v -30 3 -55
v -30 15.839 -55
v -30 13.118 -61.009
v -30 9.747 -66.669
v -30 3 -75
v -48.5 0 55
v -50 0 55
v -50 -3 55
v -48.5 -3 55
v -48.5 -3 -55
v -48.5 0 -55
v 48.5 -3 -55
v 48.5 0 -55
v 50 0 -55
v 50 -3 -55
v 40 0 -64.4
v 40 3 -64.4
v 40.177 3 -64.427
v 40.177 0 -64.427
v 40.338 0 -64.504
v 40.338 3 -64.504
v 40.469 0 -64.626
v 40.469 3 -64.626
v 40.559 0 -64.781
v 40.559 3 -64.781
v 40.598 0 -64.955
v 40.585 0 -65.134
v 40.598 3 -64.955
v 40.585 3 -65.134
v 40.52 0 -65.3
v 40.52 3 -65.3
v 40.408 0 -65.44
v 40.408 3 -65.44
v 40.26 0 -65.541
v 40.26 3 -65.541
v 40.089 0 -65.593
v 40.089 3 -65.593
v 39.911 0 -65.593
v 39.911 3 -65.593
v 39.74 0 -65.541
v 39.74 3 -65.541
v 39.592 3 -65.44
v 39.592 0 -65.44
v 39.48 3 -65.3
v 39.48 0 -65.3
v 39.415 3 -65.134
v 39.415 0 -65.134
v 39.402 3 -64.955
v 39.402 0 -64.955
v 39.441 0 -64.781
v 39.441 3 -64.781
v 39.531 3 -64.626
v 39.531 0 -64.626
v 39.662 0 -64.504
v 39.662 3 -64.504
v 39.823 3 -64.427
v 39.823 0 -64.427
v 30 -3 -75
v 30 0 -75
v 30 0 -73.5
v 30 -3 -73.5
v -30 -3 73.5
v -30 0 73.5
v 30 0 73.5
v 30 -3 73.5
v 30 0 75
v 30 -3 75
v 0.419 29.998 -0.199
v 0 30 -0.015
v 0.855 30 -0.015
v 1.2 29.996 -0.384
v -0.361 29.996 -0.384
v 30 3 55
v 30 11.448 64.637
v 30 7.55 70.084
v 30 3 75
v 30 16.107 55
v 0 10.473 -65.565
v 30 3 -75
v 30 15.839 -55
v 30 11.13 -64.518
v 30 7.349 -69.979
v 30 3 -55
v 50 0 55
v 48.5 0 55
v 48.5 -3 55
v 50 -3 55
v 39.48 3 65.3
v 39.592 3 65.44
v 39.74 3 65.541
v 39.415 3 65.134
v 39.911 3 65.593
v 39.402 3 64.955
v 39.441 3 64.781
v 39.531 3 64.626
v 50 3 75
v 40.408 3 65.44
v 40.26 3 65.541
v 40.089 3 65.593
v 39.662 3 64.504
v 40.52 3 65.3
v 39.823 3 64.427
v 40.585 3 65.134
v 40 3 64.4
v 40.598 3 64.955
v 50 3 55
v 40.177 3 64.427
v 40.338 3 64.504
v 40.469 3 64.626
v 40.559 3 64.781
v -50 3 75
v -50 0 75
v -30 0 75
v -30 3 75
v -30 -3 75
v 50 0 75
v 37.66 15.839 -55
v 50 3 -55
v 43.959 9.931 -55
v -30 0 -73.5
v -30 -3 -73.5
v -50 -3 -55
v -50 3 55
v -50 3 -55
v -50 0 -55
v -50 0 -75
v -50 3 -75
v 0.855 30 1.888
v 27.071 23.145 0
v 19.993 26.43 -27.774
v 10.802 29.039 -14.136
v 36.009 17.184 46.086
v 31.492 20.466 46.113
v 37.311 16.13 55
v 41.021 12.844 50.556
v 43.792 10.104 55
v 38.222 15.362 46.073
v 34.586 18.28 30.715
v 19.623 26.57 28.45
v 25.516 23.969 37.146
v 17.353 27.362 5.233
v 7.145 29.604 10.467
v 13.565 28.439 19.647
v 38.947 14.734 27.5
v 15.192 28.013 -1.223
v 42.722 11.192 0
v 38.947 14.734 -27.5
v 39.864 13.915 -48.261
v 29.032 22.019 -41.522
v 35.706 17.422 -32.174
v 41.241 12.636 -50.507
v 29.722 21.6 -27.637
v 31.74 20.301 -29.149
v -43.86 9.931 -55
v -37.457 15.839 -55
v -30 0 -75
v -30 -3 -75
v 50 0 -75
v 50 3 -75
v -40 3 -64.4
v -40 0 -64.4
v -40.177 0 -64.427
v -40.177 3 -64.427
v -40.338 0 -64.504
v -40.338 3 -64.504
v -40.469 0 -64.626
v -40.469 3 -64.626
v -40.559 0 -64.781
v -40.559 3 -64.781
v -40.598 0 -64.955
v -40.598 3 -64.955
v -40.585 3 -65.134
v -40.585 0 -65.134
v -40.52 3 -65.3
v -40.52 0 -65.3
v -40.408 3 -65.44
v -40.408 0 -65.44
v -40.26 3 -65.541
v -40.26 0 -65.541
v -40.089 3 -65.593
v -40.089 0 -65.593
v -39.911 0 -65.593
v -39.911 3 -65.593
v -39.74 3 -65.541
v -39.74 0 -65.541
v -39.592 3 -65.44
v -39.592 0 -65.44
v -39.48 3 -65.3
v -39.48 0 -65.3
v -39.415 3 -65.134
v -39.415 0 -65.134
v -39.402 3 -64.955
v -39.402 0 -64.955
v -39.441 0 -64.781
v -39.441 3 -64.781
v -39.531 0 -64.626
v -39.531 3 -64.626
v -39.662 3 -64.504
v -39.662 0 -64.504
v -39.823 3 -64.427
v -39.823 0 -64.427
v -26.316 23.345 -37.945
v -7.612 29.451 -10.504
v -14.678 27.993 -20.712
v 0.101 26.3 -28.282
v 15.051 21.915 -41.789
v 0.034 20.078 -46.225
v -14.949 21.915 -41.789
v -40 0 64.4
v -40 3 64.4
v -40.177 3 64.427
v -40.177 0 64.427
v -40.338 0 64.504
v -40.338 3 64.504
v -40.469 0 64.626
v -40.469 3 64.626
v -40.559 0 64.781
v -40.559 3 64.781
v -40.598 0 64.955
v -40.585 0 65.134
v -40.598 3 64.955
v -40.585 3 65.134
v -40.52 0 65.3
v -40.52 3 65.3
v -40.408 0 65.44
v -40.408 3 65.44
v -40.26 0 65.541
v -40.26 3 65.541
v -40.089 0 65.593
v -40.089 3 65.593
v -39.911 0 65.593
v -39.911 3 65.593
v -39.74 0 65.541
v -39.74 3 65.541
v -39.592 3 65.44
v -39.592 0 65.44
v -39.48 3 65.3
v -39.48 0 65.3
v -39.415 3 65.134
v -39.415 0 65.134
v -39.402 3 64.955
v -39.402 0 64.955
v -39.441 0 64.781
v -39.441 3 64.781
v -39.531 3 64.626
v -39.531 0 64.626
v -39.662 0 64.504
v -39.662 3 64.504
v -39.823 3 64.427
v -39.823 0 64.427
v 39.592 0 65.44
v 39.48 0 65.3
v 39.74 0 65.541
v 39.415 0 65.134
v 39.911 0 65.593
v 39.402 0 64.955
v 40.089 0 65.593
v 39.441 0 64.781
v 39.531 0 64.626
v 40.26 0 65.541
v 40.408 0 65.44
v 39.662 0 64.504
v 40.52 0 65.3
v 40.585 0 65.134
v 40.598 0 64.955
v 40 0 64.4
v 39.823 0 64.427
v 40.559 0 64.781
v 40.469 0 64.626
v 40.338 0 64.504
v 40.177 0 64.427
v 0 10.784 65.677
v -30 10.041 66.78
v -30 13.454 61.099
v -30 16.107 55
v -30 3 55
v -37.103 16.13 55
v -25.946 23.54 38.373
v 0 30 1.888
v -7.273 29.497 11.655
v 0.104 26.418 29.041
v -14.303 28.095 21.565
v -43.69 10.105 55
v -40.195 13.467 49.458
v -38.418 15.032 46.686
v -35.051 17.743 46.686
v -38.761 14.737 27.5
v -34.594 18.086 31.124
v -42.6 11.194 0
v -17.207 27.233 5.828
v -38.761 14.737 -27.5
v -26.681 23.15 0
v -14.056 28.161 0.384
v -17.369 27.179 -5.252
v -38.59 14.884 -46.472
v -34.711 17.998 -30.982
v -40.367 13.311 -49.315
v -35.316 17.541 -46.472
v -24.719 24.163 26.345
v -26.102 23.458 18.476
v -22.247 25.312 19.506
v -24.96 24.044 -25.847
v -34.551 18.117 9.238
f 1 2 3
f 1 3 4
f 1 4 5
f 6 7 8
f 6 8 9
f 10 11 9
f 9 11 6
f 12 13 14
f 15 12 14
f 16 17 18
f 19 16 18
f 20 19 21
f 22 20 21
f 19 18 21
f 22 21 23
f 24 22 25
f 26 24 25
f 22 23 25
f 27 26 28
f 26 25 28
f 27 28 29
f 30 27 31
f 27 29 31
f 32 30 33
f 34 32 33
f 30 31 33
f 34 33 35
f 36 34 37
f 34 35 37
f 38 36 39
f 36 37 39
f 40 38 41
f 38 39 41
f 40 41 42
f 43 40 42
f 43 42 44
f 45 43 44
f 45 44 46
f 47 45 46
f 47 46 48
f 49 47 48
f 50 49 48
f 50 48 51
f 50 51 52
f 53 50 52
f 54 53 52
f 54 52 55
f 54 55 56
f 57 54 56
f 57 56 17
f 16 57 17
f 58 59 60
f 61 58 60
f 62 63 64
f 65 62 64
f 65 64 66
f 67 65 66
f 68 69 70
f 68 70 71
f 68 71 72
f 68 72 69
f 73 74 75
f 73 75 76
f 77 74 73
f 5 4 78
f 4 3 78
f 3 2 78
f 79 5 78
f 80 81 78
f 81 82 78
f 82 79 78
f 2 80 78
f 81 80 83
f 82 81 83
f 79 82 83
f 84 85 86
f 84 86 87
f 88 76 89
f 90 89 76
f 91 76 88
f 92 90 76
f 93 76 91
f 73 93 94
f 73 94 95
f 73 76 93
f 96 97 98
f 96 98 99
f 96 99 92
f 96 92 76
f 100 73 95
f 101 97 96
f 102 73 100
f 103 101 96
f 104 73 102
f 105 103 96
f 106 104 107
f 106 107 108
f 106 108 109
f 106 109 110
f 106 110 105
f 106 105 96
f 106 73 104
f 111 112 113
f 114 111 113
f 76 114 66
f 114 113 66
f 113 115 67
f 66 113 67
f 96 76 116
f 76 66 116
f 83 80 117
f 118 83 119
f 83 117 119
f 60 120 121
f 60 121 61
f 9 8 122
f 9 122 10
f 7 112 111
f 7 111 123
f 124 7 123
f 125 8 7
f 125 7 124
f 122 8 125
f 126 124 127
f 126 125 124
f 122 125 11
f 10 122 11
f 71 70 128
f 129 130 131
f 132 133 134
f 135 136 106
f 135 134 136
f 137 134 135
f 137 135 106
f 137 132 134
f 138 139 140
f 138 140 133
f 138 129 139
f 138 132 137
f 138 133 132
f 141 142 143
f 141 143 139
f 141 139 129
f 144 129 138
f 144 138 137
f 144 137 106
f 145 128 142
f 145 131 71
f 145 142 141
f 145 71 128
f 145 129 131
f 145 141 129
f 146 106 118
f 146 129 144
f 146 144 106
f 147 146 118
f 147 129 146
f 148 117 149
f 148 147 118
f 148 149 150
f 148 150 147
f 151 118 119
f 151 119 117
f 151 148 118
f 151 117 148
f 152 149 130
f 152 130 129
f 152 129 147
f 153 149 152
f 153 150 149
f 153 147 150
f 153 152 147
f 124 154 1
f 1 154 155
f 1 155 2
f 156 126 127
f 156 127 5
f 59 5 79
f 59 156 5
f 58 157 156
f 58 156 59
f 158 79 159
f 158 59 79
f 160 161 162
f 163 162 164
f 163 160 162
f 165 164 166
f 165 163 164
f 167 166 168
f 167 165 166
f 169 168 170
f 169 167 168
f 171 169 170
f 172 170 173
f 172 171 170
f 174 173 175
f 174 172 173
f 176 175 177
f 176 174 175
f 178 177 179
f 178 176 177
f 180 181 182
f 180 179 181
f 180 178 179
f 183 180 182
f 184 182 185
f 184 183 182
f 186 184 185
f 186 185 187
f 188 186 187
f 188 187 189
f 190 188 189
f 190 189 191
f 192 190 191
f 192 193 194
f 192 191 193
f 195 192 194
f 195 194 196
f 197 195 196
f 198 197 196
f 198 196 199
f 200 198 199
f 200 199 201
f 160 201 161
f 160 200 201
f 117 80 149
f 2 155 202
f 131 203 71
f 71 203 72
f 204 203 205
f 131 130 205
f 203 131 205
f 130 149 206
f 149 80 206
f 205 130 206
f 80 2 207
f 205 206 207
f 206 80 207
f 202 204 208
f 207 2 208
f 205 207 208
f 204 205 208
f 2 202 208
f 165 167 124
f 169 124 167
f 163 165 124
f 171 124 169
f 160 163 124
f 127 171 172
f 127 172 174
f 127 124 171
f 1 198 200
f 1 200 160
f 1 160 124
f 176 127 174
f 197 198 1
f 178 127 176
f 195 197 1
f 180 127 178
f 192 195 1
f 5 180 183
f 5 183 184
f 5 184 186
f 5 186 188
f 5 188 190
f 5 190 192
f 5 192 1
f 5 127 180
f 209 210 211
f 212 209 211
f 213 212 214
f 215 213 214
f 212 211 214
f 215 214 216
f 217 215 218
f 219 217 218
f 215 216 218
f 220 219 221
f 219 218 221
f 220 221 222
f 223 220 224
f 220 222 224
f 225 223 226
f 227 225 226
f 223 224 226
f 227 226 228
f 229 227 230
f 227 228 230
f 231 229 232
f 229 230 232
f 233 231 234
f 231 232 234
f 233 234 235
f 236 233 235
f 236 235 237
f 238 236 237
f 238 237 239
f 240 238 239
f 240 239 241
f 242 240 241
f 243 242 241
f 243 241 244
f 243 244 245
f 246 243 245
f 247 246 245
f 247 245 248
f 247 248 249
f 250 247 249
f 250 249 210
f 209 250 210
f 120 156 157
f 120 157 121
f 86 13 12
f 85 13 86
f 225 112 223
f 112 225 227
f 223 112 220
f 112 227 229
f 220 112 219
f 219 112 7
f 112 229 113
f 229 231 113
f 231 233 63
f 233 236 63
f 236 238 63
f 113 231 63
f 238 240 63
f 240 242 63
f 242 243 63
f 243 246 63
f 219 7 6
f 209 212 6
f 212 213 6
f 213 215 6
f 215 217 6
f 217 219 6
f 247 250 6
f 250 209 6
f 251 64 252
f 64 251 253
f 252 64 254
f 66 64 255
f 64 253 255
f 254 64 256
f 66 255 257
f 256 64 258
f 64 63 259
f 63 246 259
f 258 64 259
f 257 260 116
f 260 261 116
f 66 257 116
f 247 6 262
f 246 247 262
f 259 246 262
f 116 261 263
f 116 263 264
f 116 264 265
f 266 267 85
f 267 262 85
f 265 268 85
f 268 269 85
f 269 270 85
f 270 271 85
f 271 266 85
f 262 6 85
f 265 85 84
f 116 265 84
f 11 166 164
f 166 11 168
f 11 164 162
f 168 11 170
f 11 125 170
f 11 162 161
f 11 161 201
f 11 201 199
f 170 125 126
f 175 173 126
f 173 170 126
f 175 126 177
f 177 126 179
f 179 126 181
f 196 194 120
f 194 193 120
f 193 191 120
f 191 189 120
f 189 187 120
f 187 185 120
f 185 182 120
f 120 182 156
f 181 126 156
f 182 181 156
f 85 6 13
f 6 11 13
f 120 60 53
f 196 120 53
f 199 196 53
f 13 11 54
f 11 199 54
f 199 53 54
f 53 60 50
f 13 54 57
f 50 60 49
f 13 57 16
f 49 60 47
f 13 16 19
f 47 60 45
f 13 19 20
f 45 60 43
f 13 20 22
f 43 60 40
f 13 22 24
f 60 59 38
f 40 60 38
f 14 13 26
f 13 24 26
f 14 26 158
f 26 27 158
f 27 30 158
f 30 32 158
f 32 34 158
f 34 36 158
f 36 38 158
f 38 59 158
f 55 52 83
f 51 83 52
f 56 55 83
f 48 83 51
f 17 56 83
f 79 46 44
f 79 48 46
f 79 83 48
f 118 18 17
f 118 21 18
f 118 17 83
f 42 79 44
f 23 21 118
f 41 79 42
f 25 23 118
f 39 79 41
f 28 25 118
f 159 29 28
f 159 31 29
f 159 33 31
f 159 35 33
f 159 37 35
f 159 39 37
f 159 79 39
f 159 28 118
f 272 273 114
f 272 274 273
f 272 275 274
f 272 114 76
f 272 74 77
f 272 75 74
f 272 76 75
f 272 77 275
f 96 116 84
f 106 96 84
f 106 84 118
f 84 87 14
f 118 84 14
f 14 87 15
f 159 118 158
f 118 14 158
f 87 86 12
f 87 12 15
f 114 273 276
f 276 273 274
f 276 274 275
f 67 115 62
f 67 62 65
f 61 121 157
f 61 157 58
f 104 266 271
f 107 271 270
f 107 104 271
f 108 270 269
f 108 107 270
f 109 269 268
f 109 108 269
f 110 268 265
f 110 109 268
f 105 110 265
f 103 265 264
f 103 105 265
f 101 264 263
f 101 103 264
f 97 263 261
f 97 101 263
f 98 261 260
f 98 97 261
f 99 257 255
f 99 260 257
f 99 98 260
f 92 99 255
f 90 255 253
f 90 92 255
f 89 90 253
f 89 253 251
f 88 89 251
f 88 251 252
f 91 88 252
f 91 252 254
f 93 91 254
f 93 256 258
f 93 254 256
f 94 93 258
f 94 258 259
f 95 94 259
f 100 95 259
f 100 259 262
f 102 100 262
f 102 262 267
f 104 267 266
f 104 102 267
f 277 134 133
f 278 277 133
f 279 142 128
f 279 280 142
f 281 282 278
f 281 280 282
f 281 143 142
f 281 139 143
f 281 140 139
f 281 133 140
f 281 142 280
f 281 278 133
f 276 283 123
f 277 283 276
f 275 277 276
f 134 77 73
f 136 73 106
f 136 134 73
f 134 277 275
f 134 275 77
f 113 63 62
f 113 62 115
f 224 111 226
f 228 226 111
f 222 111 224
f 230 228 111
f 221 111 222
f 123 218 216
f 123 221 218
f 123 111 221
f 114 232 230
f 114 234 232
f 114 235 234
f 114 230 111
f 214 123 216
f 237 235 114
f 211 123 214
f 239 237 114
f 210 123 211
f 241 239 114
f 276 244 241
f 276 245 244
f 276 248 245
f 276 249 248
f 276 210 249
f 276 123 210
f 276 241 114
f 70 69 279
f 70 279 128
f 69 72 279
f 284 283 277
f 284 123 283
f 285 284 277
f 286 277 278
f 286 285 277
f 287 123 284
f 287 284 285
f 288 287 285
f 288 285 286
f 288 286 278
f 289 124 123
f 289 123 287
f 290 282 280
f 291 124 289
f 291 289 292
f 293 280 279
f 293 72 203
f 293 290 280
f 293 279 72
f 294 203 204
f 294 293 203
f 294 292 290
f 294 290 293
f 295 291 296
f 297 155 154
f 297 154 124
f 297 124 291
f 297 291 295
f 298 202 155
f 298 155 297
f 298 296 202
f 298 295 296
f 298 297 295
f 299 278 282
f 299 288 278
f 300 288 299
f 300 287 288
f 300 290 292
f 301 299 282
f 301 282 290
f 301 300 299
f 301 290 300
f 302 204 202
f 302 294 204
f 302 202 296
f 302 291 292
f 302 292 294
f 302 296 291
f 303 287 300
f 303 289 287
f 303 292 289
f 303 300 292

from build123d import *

# Parameters (mm, degrees)
CROQUIS1_W                = 100
CROQUIS1_H                = 150
SALIENTE_EXTRUIR1_DEPTH   = 30
CROQUIS3_W                = 1.5
CROQUIS3_H                = 110
CROQUIS3_W_2              = 60
CROQUIS3_H_2              = 1.5
SALIENTE_EXTRUIR2_DEPTH   = 3
CROQUIS5_W                = 20
CROQUIS5_H                = 20
CORTAR_EXTRUIR2_DEPTH     = 27
CROQUIS6_R                = 0.6
CORTAR_EXTRUIR3_DEPTH     = 95.09569597
SIMETR_A2_COPY_1_SKETCH_R = 0.6
SIMETR_A2_COPY_1_DEPTH    = 95.09569597
CORTAR_EXTRUIR4_DEPTH     = 129.549601322
CORTAR_EXTRUIR5_START     = -150
CORTAR_EXTRUIR5_DEPTH     = 150
CORTAR_EXTRUIR6_DEPTH     = 114.688170172
CORTAR_EXTRUIR7_DEPTH     = 114.688170172


# Read off the part's stored shape, not the designer's step: Cortar-Extruir5
with BuildPart() as part:
    # Croquis1 → Saliente-Extruir1 (new body)
    with BuildSketch(Plane(origin=(0, 0, 0), x_dir=(1, 0, 0), z_dir=(0, 1, 0))):
        Rectangle(CROQUIS1_W, CROQUIS1_H)
    extrude(amount=SALIENTE_EXTRUIR1_DEPTH)

    # Croquis3 → Saliente-Extruir2 (add)
    with BuildSketch(Plane.XZ):
        with Locations((-49.25, 0)):
            Rectangle(CROQUIS3_W, CROQUIS3_H)
        with Locations((0, -74.25)):
            Rectangle(CROQUIS3_W_2, CROQUIS3_H_2)
        with Locations((49.25, 0)):
            Rectangle(CROQUIS3_W, CROQUIS3_H)
        with Locations((0, 74.25)):
            Rectangle(CROQUIS3_W_2, CROQUIS3_H_2)
    extrude(amount=SALIENTE_EXTRUIR2_DEPTH)

    # Croquis5 → Cortar-Extruir2 (cut)
    with BuildSketch(Plane(origin=(0, 30, 0), x_dir=(1, 0, 0), z_dir=(0, 1, 0))):
        with Locations((-40, 65)):
            Rectangle(CROQUIS5_W, CROQUIS5_H)
        with Locations((40, 65)):
            Rectangle(CROQUIS5_W, CROQUIS5_H)
        with Locations((40, -65)):
            Rectangle(CROQUIS5_W, CROQUIS5_H)
        with Locations((-40, -65)):
            Rectangle(CROQUIS5_W, CROQUIS5_H)
    extrude(amount=-CORTAR_EXTRUIR2_DEPTH, mode=Mode.SUBTRACT)

    # Croquis6 → Cortar-Extruir3 (cut, through all)
    with BuildSketch(Plane(origin=(0, 3, 0), x_dir=(1, 0, 0), z_dir=(0, 1, 0))):
        with Locations(Location((40, 65, 0), (0, 0, 270))):
            Circle(CROQUIS6_R)
    cortar_extruir3 = extrude(amount=-CORTAR_EXTRUIR3_DEPTH, mode=Mode.SUBTRACT)

    # Simetría1: Cortar-Extruir3 across plane
    add(cortar_extruir3.mirror(Plane.XY), mode=Mode.SUBTRACT)

    # Simetría2: Cortar-Extruir3 across plane
    add(cortar_extruir3.mirror(Plane(origin=(0, 0, 0), x_dir=(0, 0, 1), z_dir=(1, 0, 0))), mode=Mode.SUBTRACT)

    # Simetría2 copy 1 sketch → Simetría2 copy 1 (cut, through all)
    with BuildSketch(Plane(origin=(0, 3, 0), x_dir=(-1, 0, 0), z_dir=(0, 1, 0))):
        with Locations(Location((40, 65, 0), (0, 0, 270))):
            Circle(SIMETR_A2_COPY_1_SKETCH_R)
    extrude(amount=-SIMETR_A2_COPY_1_DEPTH, mode=Mode.SUBTRACT)

    # Croquis7 → Cortar-Extruir4 (cut, through all)
    with BuildSketch(Plane.ZY.offset(50)):
        with BuildLine():
            Line((-55, 30), (-55, 15.839120061))
            add(Edge.make_bspline(
                [(-55, 15.839120061), (-28.872240535, 29.681618902), (-0.383648773, 29.996375418)],
                knots=[0.272557177, 0.272557177, 0.272557177, 0.972153635, 0.972153635, 0.972153635], degree=2))
            add(Edge.make_bspline(
                [(-0.015370594, 30), (-0.199457484, 29.998481088), (-0.383648773, 29.996375418)],
                knots=[0.9954153, 0.9954153, 0.9954153, 1, 1, 1], degree=2))
            Line((-0.015370594, 30), (-55, 30))
        make_face()
        with BuildLine():
            Line((55, 30), (1.887981045, 30))
            add(Edge.make_bspline(
                [(55, 16.129627481), (29.637077968, 29.770366226), (1.887981045, 30)],
                knots=[0.278550096, 0.278550096, 0.278550096, 0.971678885, 0.971678885, 0.971678885], degree=2))
            Line((55, 16.129627481), (55, 30))
        make_face()
    extrude(amount=-CORTAR_EXTRUIR4_DEPTH, mode=Mode.SUBTRACT)

    # Cortar-Extruir5 outline → Cortar-Extruir5 (cut)
    with BuildSketch(Plane.XY.offset(75).offset(CORTAR_EXTRUIR5_START)):
        with BuildLine():
            Line((7.5e-08, 30.000000001), (-50, 30))
            Line((-50, 30), (-50, 3))
            add(Edge.make_bspline(
                [(-50, 3), (-28.36157969, 29.799939616), (7.5e-08, 30.000000001)],
                knots=[0, 0, 0, 0.985180711, 0.985180711, 0.985180711], degree=2))
        make_face()
        with BuildLine():
            Line((50, 3), (50, 30))
            Line((50, 30), (0.854762637, 30))
            add(Edge.make_bspline(
                [(0.854762637, 30), (28.715142785, 29.789747772), (50, 3)],
                knots=[0.41802479, 0.41802479, 0.41802479, 1.368246178, 1.368246178, 1.368246178], degree=2))
        make_face()
    extrude(amount=CORTAR_EXTRUIR5_DEPTH, mode=Mode.SUBTRACT)

    # Croquis10 → Cortar-Extruir6 (cut, through all)
    with BuildSketch(Plane.ZY.offset(30)):
        with BuildLine():
            Line((75, 3), (75, 42.786726144))
            Line((75, 42.786726144), (55, 42.786726144))
            Line((55, 42.786726144), (55, 16.107425877))
            add(Edge.make_bspline(
                [(75, 3), (66.353698685, 12.015089749), (55, 16.107425877)],
                knots=[0, 0, 0, 1, 1, 1], degree=2))
        make_face()
    extrude(amount=-CORTAR_EXTRUIR6_DEPTH, mode=Mode.SUBTRACT)

    # Croquis11 → Cortar-Extruir7 (cut, through all)
    with BuildSketch(Plane.ZY.offset(30)):
        with BuildLine():
            Line((-75, 3), (-75, 36.400642598))
            Line((-75, 36.400642598), (-55, 36.400642598))
            Line((-55, 36.400642598), (-55, 15.839120066))
            add(Edge.make_bspline(
                [(-75, 3), (-66.12999018, 11.527113216), (-55, 15.839120066)],
                knots=[0, 0, 0, 1, 1, 1], degree=2))
        make_face()
    extrude(amount=-CORTAR_EXTRUIR7_DEPTH, mode=Mode.SUBTRACT)


solid = part.part
